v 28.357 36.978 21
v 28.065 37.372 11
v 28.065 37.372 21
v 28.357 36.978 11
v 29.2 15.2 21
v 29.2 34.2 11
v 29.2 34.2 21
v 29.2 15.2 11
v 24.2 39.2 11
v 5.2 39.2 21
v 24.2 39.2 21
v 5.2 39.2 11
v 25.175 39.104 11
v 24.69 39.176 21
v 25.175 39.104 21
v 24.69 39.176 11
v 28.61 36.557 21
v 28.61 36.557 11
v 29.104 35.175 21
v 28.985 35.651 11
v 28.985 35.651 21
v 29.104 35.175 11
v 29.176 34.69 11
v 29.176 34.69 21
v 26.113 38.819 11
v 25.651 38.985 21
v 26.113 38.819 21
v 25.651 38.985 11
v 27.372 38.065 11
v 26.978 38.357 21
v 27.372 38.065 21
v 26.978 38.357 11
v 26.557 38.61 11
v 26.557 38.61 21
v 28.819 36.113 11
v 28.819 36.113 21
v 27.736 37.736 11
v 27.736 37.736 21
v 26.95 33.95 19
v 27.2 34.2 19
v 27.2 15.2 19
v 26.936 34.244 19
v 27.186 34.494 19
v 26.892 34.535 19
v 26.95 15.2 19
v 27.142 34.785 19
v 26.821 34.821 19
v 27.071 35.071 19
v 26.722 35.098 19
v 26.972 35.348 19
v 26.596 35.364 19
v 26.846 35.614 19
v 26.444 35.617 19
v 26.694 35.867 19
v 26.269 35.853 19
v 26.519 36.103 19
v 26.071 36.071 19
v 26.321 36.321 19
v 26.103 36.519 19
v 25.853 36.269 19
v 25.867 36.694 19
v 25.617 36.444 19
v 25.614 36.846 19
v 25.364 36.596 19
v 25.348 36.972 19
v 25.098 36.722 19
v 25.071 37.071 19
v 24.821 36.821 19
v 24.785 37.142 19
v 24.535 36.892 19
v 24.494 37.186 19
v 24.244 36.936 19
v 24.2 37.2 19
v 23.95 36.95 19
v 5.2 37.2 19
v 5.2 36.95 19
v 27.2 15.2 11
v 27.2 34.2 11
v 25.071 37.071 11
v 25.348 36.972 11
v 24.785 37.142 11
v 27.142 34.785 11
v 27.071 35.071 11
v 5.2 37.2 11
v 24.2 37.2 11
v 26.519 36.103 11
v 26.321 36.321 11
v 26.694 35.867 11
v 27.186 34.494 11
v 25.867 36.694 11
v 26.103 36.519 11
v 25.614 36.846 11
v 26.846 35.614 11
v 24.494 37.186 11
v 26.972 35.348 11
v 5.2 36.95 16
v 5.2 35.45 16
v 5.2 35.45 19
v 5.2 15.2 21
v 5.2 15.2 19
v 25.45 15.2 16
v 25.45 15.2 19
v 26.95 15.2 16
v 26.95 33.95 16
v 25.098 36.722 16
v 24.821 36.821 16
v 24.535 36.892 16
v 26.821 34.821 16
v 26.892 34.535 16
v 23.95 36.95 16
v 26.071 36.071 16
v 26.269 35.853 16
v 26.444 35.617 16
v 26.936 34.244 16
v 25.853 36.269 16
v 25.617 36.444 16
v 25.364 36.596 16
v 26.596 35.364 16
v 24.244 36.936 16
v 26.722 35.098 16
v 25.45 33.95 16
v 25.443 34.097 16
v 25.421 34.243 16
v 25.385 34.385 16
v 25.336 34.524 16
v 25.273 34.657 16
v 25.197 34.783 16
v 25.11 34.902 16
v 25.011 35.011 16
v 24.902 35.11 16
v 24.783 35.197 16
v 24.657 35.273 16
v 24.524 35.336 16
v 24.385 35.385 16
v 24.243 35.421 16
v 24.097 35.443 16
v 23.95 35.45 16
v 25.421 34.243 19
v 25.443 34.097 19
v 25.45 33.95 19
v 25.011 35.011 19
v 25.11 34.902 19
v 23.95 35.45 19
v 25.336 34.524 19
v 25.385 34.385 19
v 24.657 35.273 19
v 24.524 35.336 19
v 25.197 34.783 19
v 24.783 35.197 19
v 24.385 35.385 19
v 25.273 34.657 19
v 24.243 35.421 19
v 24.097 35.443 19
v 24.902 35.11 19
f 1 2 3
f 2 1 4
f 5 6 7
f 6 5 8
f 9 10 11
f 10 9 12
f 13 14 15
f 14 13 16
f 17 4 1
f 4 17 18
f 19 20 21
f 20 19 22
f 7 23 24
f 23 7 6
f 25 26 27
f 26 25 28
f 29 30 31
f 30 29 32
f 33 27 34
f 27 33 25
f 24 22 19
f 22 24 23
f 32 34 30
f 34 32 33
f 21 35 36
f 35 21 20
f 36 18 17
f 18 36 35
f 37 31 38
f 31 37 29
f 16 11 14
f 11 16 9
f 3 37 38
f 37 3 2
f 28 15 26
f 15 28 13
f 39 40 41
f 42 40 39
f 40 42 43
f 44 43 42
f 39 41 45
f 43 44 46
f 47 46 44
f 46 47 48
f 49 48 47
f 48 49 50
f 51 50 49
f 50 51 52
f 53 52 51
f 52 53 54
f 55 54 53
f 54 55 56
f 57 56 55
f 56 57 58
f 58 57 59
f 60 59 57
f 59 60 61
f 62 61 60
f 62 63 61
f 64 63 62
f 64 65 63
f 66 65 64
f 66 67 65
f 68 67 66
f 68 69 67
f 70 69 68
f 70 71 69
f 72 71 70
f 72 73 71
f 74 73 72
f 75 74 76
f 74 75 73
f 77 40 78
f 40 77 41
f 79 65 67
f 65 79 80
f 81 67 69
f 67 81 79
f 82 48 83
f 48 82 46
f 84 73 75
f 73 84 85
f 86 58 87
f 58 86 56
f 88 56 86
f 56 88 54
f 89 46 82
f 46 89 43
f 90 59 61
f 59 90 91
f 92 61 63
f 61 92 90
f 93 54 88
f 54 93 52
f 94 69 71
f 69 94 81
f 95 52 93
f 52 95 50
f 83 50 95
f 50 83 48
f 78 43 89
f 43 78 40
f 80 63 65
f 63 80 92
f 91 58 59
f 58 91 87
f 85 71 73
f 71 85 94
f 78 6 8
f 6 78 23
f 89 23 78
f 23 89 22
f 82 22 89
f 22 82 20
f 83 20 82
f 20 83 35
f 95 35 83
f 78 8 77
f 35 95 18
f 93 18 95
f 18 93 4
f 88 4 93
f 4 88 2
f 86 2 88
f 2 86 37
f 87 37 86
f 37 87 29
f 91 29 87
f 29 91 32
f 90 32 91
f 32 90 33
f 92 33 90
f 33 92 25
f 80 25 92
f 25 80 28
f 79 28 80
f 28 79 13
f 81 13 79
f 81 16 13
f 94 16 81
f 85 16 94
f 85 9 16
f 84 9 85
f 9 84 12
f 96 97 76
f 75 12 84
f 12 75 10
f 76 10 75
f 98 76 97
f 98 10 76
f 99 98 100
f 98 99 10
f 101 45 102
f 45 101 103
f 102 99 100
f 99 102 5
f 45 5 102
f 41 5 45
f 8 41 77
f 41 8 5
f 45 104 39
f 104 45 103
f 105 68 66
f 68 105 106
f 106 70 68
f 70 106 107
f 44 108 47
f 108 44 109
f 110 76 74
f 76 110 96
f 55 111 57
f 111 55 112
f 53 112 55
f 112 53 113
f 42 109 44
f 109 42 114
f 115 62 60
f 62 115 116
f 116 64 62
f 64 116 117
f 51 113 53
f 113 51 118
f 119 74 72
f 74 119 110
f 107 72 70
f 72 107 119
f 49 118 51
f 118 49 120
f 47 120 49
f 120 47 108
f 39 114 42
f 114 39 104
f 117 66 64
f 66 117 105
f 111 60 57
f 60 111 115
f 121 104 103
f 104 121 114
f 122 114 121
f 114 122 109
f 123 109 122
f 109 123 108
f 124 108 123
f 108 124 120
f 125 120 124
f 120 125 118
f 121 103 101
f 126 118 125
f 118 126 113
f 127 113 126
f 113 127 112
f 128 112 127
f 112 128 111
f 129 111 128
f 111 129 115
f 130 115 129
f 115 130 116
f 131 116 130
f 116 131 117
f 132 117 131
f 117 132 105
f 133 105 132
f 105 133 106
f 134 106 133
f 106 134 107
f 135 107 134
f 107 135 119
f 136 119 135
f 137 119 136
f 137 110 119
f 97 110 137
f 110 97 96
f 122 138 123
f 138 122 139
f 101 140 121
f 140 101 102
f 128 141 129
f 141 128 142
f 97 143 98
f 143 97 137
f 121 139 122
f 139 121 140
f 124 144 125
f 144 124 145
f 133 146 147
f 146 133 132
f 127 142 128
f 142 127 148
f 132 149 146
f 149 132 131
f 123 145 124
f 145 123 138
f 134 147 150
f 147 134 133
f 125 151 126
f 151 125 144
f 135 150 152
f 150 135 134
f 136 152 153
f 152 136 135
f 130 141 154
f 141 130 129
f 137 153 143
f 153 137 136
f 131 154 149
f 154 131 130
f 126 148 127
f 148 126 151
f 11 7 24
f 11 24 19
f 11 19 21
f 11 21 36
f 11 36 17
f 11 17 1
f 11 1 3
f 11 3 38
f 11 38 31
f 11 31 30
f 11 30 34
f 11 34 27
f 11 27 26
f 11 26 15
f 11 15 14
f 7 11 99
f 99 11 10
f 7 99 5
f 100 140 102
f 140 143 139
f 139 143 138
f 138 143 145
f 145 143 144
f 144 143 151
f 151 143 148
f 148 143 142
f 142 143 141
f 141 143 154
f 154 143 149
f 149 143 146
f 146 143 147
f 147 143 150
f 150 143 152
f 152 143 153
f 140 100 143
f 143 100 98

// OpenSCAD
// file: ../modules/example_config.scad
// ============================================================
//  example_config.scad — constants for the starter enclosure.
//
//  `include`d (not `use`d) by the pieces, so these are plain variables.
//  No geometry here, and no self-preview: an `include` would leak it into
//  every importer.
//
//  Every constant carries its provenance: MEASURED = verified with calipers
//  against the real part; ADJUST = an estimate, to be confirmed. Flip the tag
//  in place when the measurement arrives, and never delete the trail.
// ============================================================

// ---- the board this box houses ---------------------------------------------
// The defaults of the pcb_holder component: a generic 50 × 70 board. Swap these
// for your own and everything below follows.
BOX_PCB_W = 50;   // ADJUST: PCB width  (X, mm)
BOX_PCB_L = 70;   // ADJUST: PCB length (Y, mm)
BOX_PCB_T = 1.5;  // ADJUST: PCB thickness (mm)

// ---- what the component reserves around the board --------------------------
// pcb_holder puts an L-shaped wall of PCBH_WALL outside each PCB corner, with
// PCBH_FIT of play per side. The cavity has to clear both, or the holders would
// not fit inside their own box.
BOX_FIT         = 0.2;  // ADJUST: XY play between PCB edge and holder (per side) = PCBH_FIT
BOX_HOLDER_WALL = 2;    // ADJUST: holder outer wall = PCBH_WALL
BOX_HOLDER_H    = 5.0;  // ADJUST: total holder height, = pcb_holder_height() with the
                        // component defaults (standoff 2 + ref PCB 1.6 + slot 0.2 + lip 1.2).
                        // Mirrored here, so revisit it if the component's defaults move.

// ---- the enclosure ---------------------------------------------------------
BOX_WALL     = 2;    // ADJUST: outer wall thickness (mm)
BOX_FLOOR    = 2;    // ADJUST: floor thickness (mm)
BOX_HEADROOM = 12;   // ADJUST: free height above the holder lip, for tall components
BOX_CORNER_R = 3;    // ADJUST: inner corner radius in plan (mm)

// ---- the lid ---------------------------------------------------------------
BOX_LID_T   = 2;     // ADJUST: lid plate thickness (mm)
BOX_LIP_H   = 3;     // ADJUST: depth the lid lip plugs into the cavity (mm)
BOX_LIP_T   = 1.5;   // ADJUST: wall thickness of that lip — it is a rim, not a slab
BOX_LID_CL  = 0.25;  // ADJUST: play of that lip against the cavity wall (per side)

BOX_EPS = 0.05;      // local manifold fudge: overhang for cutters, overlap for unions

// ---- derived (functions, so `use` can read them from another file) ----------
// Cavity = board + the component's own footprint. Everything else hangs off this.
function box_cav_w() = BOX_PCB_W + 2 * (BOX_FIT + BOX_HOLDER_WALL);
function box_cav_l() = BOX_PCB_L + 2 * (BOX_FIT + BOX_HOLDER_WALL);
function box_cav_h() = BOX_HOLDER_H + BOX_HEADROOM;

function box_outer_w() = box_cav_w() + 2 * BOX_WALL;
function box_outer_l() = box_cav_l() + 2 * BOX_WALL;

// z of the rim the lid lands on (top of the base walls).
function box_rim_z() = BOX_FLOOR + box_cav_h();
// file: ../modules/lid.scad
// ============================================================
//  lid.scad — the cover of the starter enclosure: a plate with a lip that
//  plugs into the cavity and keeps it located.
//
//  Frame: XY centred like the base, and z = 0 at the MATING PLANE (the rim of
//  the base). The plate grows upward, the lip hangs downward — so in the
//  assembly it is just `translate([0, 0, box_rim_z()]) lid()`.
//  Piece, not a front door: it does NOT set $fn — main.scad does.
// ============================================================

use <../../../lib/rounded.scad>
include <example_config.scad>

module lid() {
    // The plate: same footprint as the box, so the outside is flush.
    translate([0, 0, BOX_LID_T / 2])
        rounded_flat_cube(box_outer_w(), box_outer_l(), BOX_LID_T,
                          BOX_CORNER_R + BOX_WALL);

    // The lip that enters the cavity, minus its clearance per side. It is a RIM,
    // not a slab: a solid plug would fill the box with plastic and leave no room
    // for anything standing on the board. It overlaps the plate by BOX_EPS —
    // a union of merely touching solids is a zero-thickness contact.
    lip_w = box_cav_w() - 2 * BOX_LID_CL;
    lip_l = box_cav_l() - 2 * BOX_LID_CL;
    translate([0, 0, -(BOX_LIP_H - BOX_EPS) / 2])
        difference() {
            rounded_flat_cube(lip_w, lip_l, BOX_LIP_H + BOX_EPS, BOX_CORNER_R);
            // Hollow it out. The cutter pokes past both ends so neither face is
            // left coplanar with the rim's.
            rounded_flat_cube(lip_w - 2 * BOX_LIP_T, lip_l - 2 * BOX_LIP_T,
                              BOX_LIP_H + BOX_EPS + 2 * BOX_EPS,
                              max(BOX_CORNER_R - BOX_LIP_T, 0.1));
        }
}

// ---------- Self-preview (top-level; `use <...>` ignores it) ----------
$fn = 64;
lid();
// file: ../modules/base.scad
// ============================================================
//  base.scad — the tray of the starter enclosure: a rounded shell, open on
//  top, with the PCB retainers standing on its floor.
//
//  This is the piece that shows the three layers working together:
//    · lib/rounded.scad     → the shell (a generic primitive)
//    · components/pcb_holder → the retainers (a concrete reusable part)
//    · this file             → the design that combines them
//
//  Frame: XY centred on the PCB, z = 0 at the bottom of the box (the print bed).
//  Piece, not a front door: it does NOT set $fn — main.scad does.
// ============================================================

use <../../../lib/rounded.scad>
use <../../../components/pcb_holder.scad>
include <example_config.scad>

// Invariants. They live in a module and get CALLED from the geometry, because
// OpenSCAD skips top-level statements of a file imported with `use` — an assert
// in the header would be silently ignored exactly when it matters.
module _box_asserts() {
    assert(BOX_HOLDER_H == pcb_holder_height(pcb_t = BOX_PCB_T),
           "BOX_HOLDER_H no longer matches pcb_holder_height() — the component moved; re-read its defaults and update the constant (the drawing needs it as a literal).");
}

// The tray: shell minus the cavity, plus the retainers on the floor.
module base() {
    _box_asserts();
    difference() {
        // Outer shell. The outer radius follows the inner one so the wall keeps
        // a constant thickness all the way round the corner.
        translate([0, 0, box_rim_z() / 2])
            rounded_flat_cube(box_outer_w(), box_outer_l(), box_rim_z(),
                              BOX_CORNER_R + BOX_WALL);

        // Cavity, open at the top: the cutter pokes BOX_EPS past the rim so the
        // opening is a real hole and not a coplanar face.
        translate([0, 0, BOX_FLOOR + (box_cav_h() + BOX_EPS) / 2])
            rounded_flat_cube(box_cav_w(), box_cav_l(), box_cav_h() + BOX_EPS,
                              BOX_CORNER_R);
    }

    // The retainers. Their own frame has z = 0 at the host floor, so they get
    // lifted by the floor thickness; the component does the rest.
    translate([0, 0, BOX_FLOOR])
        pcb_holder(width = BOX_PCB_W, length = BOX_PCB_L, pcb_t = BOX_PCB_T);
}

// ---------- Self-preview (top-level; `use <...>` ignores it) ----------
// Opening this file on its own in OpenSCAD shows geometry, not an empty canvas.
// $fn goes here because outside main.scad it is not inherited.
$fn = 64;
base();
// main file
// ============================================================
//  lid_fit_test.scad — TEST PIECE: does the lid rim actually fit the cavity?
//
//  The starter box has exactly one dimension that is a guess rather than a
//  measurement: BOX_LID_CL, the play between the lid rim and the cavity wall
//  (see docs/design.md, "Status and evolution"). Printing both full pieces to
//  find out costs ~30 cm3 of plastic and a couple of hours. This coupon answers
//  the same question with a corner of each, in minutes.
//
//  HOW IT REUSES THE MODEL (the rule that makes a test piece worth trusting):
//  it does NOT re-derive the geometry. It calls the real `base()` and `lid()`
//  and INTERSECTS them with a corner window — so whatever the coupon shows is,
//  by construction, what the real pieces do. Change example_config.scad and the
//  coupon follows; there is no second copy of the numbers to drift.
//
//  Both coupons are cut in the SAME frame (the lid in its assembled pose), so
//  they are guaranteed to be cut at the same place.
//
//    uv run tools/check.py projects/example/test/lid_fit_test.scad --module fit_base_print
//    uv run tools/build.py projects/example/test/lid_fit_test.scad   # both coupons -> prints/
//
//  Then: print both, push one into the other and read the fit.
//    slides together with a little play      -> BOX_LID_CL is right; flip it to MEASURED
//    will not enter / needs force            -> raise BOX_LID_CL, reprint just this
//    rattles                                 -> lower it
//  Whatever you conclude, flip the tag in example_config.scad and never delete
//  the trail (see docs/design-rules.md).
// ============================================================

use <../modules/base.scad>
use <../modules/lid.scad>
include <../modules/example_config.scad>

$fn = 180;             // this file is its own front door, so it sets the baseline

// ---- what the coupon keeps -------------------------------------------------
FIT_WIN  = 24;   // ADJUST: XY size of the corner window cut out of each piece
FIT_BAND = 8;    // ADJUST: how far below the rim the tray coupon reaches (mm)

// The window sits on the +X/+Y corner: a real corner exercises the rounded
// corner radius as well as the two straight walls, which a mid-wall slab would
// not.
function fit_win_cx() = box_outer_w() / 2 - FIT_WIN / 2;
function fit_win_cy() = box_outer_l() / 2 - FIT_WIN / 2;

module fit_window(z_lo, z_hi) {
    translate([fit_win_cx(), fit_win_cy(), (z_lo + z_hi) / 2])
        cube([FIT_WIN, FIT_WIN, z_hi - z_lo], center = true);
}

// ---- the coupons, in the assembly frame ------------------------------------
// Tray: the top band of wall, i.e. the cavity mouth the rim has to enter.
module fit_base_solid() {
    intersection() {
        base();
        fit_window(box_rim_z() - FIT_BAND, box_rim_z() + BOX_EPS);
    }
}

// Lid: plate + rim, taken in its ASSEMBLED pose so it shares the tray's frame.
module fit_lid_solid() {
    intersection() {
        translate([0, 0, box_rim_z()]) lid();
        fit_window(box_rim_z() - BOX_LIP_H - BOX_EPS, box_rim_z() + BOX_LID_T);
    }
}

// ---- printable deliverables (build discovers *_print) ----------------------
// Each coupon is moved to the origin and dropped onto the bed. The tray coupon
// prints on its cut face; the lid coupon is flipped exactly like lid_print, so
// the surface that meets the bed is the same one as on the real part.
module fit_base_print() {
    translate([-fit_win_cx(), -fit_win_cy(), -(box_rim_z() - FIT_BAND)])
        fit_base_solid();
}

module fit_lid_print() {
    translate([-fit_win_cx(), fit_win_cy(), box_rim_z() + BOX_LID_T])
        rotate([180, 0, 0])
            fit_lid_solid();
}

// ---------- Self-preview (top-level; `use <...>` ignores it) ----------
// The two coupons as they mate, which is what the test is about.
fit_base_solid();
fit_lid_solid();
